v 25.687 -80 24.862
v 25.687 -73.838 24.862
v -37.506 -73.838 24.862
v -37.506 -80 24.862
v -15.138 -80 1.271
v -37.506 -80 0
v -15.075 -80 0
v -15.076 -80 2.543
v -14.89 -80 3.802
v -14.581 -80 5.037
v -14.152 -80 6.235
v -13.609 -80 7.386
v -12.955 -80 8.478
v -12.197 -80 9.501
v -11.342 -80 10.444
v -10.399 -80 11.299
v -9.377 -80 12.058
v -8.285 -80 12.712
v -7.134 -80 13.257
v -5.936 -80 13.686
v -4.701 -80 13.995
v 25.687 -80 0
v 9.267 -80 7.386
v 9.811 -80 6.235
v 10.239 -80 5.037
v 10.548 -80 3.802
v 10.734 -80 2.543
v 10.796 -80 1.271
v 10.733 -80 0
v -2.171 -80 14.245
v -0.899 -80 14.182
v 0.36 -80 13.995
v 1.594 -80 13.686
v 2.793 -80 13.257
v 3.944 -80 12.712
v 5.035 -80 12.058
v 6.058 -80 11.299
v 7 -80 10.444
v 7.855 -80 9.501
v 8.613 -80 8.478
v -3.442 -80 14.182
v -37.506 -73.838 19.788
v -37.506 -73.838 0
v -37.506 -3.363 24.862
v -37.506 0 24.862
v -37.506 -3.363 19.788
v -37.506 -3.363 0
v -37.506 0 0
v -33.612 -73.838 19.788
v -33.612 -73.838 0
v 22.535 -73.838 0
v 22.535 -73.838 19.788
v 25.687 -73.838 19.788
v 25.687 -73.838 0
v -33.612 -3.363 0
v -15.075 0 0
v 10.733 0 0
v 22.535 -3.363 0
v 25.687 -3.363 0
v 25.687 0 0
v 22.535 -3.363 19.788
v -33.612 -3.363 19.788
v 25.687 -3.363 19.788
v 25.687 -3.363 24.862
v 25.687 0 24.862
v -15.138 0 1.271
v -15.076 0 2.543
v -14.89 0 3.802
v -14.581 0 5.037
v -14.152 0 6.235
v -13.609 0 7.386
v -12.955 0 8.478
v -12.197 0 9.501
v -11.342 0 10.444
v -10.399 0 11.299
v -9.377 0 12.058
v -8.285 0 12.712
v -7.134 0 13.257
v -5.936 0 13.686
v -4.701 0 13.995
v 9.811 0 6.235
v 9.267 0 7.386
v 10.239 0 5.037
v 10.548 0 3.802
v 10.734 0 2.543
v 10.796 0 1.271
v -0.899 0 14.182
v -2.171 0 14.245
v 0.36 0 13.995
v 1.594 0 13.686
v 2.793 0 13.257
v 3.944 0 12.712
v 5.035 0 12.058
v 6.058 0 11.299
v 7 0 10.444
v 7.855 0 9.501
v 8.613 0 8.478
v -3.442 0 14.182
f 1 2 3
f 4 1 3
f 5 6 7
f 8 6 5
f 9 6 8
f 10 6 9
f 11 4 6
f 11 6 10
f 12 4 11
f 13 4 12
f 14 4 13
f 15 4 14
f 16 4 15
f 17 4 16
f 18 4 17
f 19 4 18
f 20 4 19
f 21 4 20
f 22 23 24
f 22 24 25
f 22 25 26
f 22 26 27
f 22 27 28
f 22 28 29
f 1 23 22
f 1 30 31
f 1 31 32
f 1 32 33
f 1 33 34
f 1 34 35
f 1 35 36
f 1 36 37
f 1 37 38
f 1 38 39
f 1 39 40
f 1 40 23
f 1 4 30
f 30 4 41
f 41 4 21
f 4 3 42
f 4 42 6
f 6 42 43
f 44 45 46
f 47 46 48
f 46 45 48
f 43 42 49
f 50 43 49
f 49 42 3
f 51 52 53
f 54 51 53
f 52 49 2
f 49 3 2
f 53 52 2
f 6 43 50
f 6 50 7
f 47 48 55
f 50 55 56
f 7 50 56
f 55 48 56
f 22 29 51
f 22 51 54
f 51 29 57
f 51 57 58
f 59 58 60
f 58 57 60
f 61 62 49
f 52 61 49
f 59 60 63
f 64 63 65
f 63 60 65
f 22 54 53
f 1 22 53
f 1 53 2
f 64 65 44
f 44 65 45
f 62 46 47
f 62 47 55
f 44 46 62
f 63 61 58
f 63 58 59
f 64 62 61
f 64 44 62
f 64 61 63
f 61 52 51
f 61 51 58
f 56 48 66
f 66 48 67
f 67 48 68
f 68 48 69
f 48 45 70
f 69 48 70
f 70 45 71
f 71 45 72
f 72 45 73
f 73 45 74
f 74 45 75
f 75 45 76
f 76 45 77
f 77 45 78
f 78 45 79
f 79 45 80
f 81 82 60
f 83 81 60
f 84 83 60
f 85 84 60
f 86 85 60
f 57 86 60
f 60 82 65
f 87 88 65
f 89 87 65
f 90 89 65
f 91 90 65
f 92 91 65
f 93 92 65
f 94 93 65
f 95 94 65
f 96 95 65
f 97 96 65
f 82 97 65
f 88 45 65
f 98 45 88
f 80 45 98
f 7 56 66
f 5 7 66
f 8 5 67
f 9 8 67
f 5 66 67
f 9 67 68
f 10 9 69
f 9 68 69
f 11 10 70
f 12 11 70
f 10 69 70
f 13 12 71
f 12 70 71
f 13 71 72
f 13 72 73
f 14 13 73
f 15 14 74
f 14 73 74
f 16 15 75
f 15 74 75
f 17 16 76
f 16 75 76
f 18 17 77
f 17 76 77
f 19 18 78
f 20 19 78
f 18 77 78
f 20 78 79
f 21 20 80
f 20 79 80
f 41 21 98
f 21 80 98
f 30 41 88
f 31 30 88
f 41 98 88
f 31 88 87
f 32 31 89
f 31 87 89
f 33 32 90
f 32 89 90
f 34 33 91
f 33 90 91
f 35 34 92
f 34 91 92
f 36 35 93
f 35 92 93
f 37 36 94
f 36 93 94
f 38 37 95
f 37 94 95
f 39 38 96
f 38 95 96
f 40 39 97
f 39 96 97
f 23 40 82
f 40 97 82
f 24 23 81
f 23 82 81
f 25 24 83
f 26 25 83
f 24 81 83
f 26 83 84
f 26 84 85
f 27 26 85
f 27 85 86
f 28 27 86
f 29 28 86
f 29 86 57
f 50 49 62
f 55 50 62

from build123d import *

# Parameters (mm, degrees)
F1_DEPTH = 80
F2_W     = 70.4753454775
F2_H     = 5.0733083159
F3_DEPTH = 64
F4_W     = 3.8940757513
F4_H     = 70.4753454775
F5_DEPTH = 25
F4_W_2   = 3.1526088715
F6_DEPTH = 25


with BuildPart() as f1:
    # F0 (on Front) → F1 (new body)
    with BuildSketch(Plane.XZ):
        with BuildLine():
            Line((-37.5057458878, 24.8617598087), (-37.5057458878, 0))
            Line((-37.5057458878, 0), (-15.074656345, 0))
            ThreePointArc((-15.074656345, 0), (-2.17074994, 14.2445032908), (10.733156465, 0))
            Line((10.733156465, 0), (25.6872158498, 0))
            Line((25.6872158498, 0), (25.6872158498, 24.8617598087))
            Line((25.6872158498, 24.8617598087), (-37.5057458878, 24.8617598087))
        make_face()
    extrude(amount=F1_DEPTH)

    # F2 (on face) → F3 (cut)
    with BuildSketch(Plane(origin=(-37.5057458878, 0, 0), x_dir=(0, -1, 0), z_dir=(-1, 0, 0))):
        with Locations((38.6002035812, 22.3251056507)):
            Rectangle(F2_W, F2_H)
    extrude(amount=-F3_DEPTH, mode=Mode.SUBTRACT)

    # F4 (on face) → F5 (cut)
    with BuildSketch(Plane.XY.offset(19.7884514928)):
        with Locations((-35.5587080121, -38.6002035812)):
            Rectangle(F4_W, F4_H)
    extrude(amount=-F5_DEPTH, mode=Mode.SUBTRACT)

    # F4 (on face) → F6 (cut)
    with BuildSketch(Plane.XY.offset(19.7884514928)):
        with Locations((24.110911414, -38.6002035812)):
            Rectangle(F4_W_2, F4_H)
        with Locations((-35.5587080121, -38.6002035812)):
            Rectangle(F4_W, F4_H)
    extrude(amount=-F6_DEPTH, mode=Mode.SUBTRACT)


solid = f1.part
